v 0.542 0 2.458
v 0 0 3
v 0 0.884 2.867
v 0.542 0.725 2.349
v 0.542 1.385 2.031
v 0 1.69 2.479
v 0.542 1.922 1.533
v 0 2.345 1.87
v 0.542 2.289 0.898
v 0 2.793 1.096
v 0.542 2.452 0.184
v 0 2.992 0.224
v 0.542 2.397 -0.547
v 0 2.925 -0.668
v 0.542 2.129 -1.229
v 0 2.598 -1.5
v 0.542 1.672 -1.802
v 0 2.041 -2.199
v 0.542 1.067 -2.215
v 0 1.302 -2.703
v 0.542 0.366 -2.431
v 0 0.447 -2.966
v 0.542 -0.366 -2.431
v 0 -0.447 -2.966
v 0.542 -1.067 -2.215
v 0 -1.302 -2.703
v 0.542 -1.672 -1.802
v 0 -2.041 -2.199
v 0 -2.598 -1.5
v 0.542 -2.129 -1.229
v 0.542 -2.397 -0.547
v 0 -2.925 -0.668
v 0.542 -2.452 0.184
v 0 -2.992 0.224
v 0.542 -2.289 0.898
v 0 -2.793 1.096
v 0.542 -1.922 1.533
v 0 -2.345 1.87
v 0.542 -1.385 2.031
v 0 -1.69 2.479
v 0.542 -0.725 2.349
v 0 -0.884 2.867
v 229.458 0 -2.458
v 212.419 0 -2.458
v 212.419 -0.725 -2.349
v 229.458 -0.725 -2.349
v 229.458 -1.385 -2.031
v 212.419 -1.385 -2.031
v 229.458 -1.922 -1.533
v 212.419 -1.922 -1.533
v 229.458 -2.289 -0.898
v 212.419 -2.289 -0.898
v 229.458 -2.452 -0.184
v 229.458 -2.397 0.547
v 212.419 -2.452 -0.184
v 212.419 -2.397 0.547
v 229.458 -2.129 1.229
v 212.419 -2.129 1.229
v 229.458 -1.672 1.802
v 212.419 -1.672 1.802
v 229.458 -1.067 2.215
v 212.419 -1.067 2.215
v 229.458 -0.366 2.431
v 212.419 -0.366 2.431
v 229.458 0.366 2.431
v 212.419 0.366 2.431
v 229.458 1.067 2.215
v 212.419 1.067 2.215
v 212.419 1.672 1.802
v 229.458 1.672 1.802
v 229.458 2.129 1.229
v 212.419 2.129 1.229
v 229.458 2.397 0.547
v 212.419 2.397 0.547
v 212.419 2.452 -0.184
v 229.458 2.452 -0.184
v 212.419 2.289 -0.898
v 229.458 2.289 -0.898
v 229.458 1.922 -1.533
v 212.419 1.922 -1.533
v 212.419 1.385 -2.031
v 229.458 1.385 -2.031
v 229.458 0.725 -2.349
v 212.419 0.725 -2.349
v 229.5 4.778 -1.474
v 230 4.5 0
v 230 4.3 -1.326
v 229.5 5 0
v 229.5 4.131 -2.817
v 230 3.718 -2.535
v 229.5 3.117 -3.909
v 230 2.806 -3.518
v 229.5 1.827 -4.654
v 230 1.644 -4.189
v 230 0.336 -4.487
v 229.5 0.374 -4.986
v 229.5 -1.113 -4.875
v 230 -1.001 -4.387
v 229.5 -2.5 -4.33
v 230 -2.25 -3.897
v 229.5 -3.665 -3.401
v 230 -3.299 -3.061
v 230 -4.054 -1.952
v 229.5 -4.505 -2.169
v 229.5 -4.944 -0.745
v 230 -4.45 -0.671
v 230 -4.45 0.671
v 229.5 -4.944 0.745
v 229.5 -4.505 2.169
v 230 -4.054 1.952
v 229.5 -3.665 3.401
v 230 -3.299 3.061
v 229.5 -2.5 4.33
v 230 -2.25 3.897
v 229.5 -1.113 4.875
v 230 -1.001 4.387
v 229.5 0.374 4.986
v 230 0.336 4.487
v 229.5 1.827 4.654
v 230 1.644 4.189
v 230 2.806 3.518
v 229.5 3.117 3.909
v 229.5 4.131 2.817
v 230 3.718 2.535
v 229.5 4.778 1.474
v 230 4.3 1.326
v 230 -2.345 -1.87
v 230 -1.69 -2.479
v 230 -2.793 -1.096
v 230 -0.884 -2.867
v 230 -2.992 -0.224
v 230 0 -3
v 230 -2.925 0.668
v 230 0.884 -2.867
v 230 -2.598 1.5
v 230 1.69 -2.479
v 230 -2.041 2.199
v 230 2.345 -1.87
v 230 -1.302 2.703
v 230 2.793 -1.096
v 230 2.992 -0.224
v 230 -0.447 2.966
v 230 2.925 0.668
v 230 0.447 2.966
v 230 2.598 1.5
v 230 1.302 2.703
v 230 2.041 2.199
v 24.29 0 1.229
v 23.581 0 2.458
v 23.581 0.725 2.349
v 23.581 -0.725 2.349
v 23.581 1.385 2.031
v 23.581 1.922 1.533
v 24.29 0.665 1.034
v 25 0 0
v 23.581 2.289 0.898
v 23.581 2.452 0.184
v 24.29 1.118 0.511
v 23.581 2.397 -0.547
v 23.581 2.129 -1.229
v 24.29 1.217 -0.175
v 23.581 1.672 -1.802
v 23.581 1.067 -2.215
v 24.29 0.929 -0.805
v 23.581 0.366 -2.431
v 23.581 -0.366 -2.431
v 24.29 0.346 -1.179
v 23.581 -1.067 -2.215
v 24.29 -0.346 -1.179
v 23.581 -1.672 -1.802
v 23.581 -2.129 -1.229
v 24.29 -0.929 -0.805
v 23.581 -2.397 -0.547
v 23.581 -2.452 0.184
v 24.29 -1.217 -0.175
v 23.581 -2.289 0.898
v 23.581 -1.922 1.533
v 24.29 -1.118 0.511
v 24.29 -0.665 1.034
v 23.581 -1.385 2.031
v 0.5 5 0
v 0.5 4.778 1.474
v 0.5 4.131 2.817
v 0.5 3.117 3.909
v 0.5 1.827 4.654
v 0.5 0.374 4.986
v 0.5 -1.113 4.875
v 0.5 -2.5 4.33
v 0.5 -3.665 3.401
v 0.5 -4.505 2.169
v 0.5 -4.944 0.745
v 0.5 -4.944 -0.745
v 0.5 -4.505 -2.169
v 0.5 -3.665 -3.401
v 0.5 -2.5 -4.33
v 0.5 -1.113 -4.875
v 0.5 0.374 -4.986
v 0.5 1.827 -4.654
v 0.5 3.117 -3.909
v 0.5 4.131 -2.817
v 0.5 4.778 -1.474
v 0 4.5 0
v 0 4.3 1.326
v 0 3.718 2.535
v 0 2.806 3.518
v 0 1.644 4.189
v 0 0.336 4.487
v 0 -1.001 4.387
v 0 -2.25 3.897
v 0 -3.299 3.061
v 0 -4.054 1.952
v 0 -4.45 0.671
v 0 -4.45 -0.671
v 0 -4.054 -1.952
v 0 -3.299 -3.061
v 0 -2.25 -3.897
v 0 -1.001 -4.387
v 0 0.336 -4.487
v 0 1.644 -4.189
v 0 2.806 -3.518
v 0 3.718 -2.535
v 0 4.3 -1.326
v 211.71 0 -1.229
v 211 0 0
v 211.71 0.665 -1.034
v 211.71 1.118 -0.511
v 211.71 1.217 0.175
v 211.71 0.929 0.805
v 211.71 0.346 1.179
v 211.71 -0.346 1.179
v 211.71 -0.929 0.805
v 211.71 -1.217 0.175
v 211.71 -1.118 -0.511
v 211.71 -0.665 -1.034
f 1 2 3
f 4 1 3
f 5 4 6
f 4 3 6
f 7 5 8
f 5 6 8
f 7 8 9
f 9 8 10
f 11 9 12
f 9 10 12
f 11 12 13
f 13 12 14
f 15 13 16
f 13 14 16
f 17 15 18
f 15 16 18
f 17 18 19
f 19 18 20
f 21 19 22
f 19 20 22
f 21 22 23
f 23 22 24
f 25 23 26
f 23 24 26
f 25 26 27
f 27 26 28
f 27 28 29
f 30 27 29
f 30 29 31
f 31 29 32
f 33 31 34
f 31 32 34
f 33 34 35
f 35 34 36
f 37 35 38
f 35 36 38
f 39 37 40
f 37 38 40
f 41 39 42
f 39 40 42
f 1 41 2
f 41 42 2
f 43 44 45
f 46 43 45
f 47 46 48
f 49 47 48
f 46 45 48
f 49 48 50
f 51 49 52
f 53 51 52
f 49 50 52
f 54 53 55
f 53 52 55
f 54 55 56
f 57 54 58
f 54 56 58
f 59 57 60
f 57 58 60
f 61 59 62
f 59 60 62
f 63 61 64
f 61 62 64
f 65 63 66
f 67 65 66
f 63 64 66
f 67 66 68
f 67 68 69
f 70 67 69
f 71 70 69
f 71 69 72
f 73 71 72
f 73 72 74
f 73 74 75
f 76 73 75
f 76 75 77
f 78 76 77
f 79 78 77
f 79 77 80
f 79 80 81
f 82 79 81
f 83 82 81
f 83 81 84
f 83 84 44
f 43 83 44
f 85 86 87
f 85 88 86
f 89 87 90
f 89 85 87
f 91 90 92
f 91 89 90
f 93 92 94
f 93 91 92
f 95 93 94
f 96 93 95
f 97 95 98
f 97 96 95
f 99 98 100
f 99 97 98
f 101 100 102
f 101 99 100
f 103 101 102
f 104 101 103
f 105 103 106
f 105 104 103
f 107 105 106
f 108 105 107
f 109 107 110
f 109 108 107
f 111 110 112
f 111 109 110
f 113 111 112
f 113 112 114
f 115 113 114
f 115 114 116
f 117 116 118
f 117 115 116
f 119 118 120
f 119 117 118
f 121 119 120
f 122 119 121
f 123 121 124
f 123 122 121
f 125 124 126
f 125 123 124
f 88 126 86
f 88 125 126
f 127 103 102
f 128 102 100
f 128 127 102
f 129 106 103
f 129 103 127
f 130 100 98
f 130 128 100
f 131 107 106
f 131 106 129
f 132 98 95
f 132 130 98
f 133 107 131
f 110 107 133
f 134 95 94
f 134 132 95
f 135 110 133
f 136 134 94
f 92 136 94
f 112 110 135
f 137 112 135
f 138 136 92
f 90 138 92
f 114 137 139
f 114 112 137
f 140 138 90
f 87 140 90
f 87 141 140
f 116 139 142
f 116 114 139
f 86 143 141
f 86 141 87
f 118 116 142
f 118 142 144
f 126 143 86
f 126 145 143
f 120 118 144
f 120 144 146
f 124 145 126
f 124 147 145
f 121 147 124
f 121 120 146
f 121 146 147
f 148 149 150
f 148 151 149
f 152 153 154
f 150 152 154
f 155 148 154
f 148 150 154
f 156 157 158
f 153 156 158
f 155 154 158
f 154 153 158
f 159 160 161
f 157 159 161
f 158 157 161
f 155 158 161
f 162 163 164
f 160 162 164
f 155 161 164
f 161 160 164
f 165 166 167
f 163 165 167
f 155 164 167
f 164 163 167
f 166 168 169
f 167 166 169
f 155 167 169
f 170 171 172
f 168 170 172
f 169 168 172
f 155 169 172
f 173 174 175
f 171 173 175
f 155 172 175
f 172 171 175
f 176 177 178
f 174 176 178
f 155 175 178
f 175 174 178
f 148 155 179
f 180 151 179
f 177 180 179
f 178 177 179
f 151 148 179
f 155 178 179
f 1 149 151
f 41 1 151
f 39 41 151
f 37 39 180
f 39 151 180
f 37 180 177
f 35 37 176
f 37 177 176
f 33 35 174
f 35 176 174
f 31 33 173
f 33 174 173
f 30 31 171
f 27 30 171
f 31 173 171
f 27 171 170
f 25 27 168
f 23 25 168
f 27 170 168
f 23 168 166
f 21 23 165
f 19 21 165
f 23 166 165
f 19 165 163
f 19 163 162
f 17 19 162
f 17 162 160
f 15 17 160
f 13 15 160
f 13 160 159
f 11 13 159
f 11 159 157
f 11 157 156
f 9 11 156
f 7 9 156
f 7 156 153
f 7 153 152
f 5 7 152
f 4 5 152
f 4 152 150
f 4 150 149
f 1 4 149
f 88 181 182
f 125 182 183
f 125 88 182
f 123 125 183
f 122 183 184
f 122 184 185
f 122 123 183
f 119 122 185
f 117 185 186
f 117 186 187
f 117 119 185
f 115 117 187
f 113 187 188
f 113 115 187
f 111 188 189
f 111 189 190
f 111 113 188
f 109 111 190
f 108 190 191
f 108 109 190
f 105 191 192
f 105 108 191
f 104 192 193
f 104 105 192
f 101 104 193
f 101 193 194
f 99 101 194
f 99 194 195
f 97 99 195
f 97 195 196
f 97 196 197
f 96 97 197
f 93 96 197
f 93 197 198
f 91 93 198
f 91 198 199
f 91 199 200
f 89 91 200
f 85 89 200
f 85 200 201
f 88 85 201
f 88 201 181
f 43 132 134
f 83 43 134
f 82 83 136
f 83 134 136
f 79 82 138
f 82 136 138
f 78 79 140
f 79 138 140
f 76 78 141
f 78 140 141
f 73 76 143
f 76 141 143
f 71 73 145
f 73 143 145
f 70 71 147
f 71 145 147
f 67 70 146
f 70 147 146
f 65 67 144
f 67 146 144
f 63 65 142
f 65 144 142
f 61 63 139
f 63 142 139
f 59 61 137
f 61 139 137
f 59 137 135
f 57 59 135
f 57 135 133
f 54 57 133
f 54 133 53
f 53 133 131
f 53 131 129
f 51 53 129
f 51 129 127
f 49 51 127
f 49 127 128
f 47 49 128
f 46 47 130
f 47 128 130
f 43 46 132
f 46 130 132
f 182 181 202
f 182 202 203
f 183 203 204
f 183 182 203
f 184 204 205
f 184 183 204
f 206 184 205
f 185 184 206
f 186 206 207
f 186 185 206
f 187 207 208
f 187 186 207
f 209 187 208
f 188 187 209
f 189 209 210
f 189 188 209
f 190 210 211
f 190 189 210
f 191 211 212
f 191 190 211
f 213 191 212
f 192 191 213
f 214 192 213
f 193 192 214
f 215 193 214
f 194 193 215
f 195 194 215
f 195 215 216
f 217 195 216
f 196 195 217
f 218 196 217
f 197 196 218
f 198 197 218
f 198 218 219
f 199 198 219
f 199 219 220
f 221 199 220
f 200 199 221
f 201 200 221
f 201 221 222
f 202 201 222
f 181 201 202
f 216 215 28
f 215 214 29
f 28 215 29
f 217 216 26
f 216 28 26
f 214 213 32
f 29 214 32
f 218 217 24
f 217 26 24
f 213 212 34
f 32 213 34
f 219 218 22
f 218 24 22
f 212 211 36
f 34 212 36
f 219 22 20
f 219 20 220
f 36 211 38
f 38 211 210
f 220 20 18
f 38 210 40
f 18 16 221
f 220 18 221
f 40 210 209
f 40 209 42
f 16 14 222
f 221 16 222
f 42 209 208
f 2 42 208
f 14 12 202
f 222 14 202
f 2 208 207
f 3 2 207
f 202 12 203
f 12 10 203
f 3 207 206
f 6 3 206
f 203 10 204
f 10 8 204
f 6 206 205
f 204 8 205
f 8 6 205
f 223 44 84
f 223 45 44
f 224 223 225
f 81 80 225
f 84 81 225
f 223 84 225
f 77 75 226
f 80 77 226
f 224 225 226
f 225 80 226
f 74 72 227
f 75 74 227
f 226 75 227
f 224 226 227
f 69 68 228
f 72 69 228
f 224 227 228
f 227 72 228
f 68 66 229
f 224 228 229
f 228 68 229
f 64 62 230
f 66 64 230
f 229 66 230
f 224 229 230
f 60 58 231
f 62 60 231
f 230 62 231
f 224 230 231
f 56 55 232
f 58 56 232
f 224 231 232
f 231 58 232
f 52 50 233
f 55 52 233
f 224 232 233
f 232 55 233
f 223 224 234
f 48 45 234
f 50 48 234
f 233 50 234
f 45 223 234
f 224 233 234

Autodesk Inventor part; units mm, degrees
ref_plane "YZ Plane" through (0, 0, 0) normal (1, 0, 0) x (0, 1, 0)
ref_plane "XZ Plane" through (0, 0, 0) normal (0, 1, 0) x (-1, 0, 0)
ref_plane "XY Plane" through (0, 0, 0) normal (0, 0, 1) x (1, 0, 0)
sketch "Sketch_1" plane through (0, 0, 0) normal (0, 0, 1) x (1, 0, 0)
  line L0 (230, 0) -> (0, 0)
  line L1 (0, 0) -> (0, 4.5)
  line L2 (0, 4.5) -> (0.5, 5)
  line L3 (0.5, 5) -> (229.5, 5)
  line L4 (229.5, 5) -> (230, 4.5)
  line L5 (230, 4.5) -> (230, 0)
  line L6 (230, 0) -> (0, 0)
revolve "Revolution1" add sketch "Sketch_1" angle 360 about axis through (230, 0, 0) along (1, 0, 0)
sketch "Sketch2" plane through (0, 0, 0) normal (-1, 0, 0) x (0, 0, 1)
  point P0 (0, 0)
hole "Hole1" at (0, 0, 0) direction (1, 0, 0) diameter 4.917 depth 23.5806 tip angle 120 countersink diameter 6 countersink angle 90 thread size "M6x1" class "6H" standard "ISO Metric profile"
sketch "Sketch3" plane through (230, 0, 0) normal (1, 0, 0) x (0, 0, -1)
  point P0 (0, 0)
hole "Hole2" at (230, 0, 0) direction (-1, 0, 0) diameter 4.917 depth 17.5806 tip angle 120 countersink diameter 6 countersink angle 90 thread size "M6x1" class "6H" standard "ISO Metric profile"
properties part number "SSFRW10-230-MD6-N6_s"
